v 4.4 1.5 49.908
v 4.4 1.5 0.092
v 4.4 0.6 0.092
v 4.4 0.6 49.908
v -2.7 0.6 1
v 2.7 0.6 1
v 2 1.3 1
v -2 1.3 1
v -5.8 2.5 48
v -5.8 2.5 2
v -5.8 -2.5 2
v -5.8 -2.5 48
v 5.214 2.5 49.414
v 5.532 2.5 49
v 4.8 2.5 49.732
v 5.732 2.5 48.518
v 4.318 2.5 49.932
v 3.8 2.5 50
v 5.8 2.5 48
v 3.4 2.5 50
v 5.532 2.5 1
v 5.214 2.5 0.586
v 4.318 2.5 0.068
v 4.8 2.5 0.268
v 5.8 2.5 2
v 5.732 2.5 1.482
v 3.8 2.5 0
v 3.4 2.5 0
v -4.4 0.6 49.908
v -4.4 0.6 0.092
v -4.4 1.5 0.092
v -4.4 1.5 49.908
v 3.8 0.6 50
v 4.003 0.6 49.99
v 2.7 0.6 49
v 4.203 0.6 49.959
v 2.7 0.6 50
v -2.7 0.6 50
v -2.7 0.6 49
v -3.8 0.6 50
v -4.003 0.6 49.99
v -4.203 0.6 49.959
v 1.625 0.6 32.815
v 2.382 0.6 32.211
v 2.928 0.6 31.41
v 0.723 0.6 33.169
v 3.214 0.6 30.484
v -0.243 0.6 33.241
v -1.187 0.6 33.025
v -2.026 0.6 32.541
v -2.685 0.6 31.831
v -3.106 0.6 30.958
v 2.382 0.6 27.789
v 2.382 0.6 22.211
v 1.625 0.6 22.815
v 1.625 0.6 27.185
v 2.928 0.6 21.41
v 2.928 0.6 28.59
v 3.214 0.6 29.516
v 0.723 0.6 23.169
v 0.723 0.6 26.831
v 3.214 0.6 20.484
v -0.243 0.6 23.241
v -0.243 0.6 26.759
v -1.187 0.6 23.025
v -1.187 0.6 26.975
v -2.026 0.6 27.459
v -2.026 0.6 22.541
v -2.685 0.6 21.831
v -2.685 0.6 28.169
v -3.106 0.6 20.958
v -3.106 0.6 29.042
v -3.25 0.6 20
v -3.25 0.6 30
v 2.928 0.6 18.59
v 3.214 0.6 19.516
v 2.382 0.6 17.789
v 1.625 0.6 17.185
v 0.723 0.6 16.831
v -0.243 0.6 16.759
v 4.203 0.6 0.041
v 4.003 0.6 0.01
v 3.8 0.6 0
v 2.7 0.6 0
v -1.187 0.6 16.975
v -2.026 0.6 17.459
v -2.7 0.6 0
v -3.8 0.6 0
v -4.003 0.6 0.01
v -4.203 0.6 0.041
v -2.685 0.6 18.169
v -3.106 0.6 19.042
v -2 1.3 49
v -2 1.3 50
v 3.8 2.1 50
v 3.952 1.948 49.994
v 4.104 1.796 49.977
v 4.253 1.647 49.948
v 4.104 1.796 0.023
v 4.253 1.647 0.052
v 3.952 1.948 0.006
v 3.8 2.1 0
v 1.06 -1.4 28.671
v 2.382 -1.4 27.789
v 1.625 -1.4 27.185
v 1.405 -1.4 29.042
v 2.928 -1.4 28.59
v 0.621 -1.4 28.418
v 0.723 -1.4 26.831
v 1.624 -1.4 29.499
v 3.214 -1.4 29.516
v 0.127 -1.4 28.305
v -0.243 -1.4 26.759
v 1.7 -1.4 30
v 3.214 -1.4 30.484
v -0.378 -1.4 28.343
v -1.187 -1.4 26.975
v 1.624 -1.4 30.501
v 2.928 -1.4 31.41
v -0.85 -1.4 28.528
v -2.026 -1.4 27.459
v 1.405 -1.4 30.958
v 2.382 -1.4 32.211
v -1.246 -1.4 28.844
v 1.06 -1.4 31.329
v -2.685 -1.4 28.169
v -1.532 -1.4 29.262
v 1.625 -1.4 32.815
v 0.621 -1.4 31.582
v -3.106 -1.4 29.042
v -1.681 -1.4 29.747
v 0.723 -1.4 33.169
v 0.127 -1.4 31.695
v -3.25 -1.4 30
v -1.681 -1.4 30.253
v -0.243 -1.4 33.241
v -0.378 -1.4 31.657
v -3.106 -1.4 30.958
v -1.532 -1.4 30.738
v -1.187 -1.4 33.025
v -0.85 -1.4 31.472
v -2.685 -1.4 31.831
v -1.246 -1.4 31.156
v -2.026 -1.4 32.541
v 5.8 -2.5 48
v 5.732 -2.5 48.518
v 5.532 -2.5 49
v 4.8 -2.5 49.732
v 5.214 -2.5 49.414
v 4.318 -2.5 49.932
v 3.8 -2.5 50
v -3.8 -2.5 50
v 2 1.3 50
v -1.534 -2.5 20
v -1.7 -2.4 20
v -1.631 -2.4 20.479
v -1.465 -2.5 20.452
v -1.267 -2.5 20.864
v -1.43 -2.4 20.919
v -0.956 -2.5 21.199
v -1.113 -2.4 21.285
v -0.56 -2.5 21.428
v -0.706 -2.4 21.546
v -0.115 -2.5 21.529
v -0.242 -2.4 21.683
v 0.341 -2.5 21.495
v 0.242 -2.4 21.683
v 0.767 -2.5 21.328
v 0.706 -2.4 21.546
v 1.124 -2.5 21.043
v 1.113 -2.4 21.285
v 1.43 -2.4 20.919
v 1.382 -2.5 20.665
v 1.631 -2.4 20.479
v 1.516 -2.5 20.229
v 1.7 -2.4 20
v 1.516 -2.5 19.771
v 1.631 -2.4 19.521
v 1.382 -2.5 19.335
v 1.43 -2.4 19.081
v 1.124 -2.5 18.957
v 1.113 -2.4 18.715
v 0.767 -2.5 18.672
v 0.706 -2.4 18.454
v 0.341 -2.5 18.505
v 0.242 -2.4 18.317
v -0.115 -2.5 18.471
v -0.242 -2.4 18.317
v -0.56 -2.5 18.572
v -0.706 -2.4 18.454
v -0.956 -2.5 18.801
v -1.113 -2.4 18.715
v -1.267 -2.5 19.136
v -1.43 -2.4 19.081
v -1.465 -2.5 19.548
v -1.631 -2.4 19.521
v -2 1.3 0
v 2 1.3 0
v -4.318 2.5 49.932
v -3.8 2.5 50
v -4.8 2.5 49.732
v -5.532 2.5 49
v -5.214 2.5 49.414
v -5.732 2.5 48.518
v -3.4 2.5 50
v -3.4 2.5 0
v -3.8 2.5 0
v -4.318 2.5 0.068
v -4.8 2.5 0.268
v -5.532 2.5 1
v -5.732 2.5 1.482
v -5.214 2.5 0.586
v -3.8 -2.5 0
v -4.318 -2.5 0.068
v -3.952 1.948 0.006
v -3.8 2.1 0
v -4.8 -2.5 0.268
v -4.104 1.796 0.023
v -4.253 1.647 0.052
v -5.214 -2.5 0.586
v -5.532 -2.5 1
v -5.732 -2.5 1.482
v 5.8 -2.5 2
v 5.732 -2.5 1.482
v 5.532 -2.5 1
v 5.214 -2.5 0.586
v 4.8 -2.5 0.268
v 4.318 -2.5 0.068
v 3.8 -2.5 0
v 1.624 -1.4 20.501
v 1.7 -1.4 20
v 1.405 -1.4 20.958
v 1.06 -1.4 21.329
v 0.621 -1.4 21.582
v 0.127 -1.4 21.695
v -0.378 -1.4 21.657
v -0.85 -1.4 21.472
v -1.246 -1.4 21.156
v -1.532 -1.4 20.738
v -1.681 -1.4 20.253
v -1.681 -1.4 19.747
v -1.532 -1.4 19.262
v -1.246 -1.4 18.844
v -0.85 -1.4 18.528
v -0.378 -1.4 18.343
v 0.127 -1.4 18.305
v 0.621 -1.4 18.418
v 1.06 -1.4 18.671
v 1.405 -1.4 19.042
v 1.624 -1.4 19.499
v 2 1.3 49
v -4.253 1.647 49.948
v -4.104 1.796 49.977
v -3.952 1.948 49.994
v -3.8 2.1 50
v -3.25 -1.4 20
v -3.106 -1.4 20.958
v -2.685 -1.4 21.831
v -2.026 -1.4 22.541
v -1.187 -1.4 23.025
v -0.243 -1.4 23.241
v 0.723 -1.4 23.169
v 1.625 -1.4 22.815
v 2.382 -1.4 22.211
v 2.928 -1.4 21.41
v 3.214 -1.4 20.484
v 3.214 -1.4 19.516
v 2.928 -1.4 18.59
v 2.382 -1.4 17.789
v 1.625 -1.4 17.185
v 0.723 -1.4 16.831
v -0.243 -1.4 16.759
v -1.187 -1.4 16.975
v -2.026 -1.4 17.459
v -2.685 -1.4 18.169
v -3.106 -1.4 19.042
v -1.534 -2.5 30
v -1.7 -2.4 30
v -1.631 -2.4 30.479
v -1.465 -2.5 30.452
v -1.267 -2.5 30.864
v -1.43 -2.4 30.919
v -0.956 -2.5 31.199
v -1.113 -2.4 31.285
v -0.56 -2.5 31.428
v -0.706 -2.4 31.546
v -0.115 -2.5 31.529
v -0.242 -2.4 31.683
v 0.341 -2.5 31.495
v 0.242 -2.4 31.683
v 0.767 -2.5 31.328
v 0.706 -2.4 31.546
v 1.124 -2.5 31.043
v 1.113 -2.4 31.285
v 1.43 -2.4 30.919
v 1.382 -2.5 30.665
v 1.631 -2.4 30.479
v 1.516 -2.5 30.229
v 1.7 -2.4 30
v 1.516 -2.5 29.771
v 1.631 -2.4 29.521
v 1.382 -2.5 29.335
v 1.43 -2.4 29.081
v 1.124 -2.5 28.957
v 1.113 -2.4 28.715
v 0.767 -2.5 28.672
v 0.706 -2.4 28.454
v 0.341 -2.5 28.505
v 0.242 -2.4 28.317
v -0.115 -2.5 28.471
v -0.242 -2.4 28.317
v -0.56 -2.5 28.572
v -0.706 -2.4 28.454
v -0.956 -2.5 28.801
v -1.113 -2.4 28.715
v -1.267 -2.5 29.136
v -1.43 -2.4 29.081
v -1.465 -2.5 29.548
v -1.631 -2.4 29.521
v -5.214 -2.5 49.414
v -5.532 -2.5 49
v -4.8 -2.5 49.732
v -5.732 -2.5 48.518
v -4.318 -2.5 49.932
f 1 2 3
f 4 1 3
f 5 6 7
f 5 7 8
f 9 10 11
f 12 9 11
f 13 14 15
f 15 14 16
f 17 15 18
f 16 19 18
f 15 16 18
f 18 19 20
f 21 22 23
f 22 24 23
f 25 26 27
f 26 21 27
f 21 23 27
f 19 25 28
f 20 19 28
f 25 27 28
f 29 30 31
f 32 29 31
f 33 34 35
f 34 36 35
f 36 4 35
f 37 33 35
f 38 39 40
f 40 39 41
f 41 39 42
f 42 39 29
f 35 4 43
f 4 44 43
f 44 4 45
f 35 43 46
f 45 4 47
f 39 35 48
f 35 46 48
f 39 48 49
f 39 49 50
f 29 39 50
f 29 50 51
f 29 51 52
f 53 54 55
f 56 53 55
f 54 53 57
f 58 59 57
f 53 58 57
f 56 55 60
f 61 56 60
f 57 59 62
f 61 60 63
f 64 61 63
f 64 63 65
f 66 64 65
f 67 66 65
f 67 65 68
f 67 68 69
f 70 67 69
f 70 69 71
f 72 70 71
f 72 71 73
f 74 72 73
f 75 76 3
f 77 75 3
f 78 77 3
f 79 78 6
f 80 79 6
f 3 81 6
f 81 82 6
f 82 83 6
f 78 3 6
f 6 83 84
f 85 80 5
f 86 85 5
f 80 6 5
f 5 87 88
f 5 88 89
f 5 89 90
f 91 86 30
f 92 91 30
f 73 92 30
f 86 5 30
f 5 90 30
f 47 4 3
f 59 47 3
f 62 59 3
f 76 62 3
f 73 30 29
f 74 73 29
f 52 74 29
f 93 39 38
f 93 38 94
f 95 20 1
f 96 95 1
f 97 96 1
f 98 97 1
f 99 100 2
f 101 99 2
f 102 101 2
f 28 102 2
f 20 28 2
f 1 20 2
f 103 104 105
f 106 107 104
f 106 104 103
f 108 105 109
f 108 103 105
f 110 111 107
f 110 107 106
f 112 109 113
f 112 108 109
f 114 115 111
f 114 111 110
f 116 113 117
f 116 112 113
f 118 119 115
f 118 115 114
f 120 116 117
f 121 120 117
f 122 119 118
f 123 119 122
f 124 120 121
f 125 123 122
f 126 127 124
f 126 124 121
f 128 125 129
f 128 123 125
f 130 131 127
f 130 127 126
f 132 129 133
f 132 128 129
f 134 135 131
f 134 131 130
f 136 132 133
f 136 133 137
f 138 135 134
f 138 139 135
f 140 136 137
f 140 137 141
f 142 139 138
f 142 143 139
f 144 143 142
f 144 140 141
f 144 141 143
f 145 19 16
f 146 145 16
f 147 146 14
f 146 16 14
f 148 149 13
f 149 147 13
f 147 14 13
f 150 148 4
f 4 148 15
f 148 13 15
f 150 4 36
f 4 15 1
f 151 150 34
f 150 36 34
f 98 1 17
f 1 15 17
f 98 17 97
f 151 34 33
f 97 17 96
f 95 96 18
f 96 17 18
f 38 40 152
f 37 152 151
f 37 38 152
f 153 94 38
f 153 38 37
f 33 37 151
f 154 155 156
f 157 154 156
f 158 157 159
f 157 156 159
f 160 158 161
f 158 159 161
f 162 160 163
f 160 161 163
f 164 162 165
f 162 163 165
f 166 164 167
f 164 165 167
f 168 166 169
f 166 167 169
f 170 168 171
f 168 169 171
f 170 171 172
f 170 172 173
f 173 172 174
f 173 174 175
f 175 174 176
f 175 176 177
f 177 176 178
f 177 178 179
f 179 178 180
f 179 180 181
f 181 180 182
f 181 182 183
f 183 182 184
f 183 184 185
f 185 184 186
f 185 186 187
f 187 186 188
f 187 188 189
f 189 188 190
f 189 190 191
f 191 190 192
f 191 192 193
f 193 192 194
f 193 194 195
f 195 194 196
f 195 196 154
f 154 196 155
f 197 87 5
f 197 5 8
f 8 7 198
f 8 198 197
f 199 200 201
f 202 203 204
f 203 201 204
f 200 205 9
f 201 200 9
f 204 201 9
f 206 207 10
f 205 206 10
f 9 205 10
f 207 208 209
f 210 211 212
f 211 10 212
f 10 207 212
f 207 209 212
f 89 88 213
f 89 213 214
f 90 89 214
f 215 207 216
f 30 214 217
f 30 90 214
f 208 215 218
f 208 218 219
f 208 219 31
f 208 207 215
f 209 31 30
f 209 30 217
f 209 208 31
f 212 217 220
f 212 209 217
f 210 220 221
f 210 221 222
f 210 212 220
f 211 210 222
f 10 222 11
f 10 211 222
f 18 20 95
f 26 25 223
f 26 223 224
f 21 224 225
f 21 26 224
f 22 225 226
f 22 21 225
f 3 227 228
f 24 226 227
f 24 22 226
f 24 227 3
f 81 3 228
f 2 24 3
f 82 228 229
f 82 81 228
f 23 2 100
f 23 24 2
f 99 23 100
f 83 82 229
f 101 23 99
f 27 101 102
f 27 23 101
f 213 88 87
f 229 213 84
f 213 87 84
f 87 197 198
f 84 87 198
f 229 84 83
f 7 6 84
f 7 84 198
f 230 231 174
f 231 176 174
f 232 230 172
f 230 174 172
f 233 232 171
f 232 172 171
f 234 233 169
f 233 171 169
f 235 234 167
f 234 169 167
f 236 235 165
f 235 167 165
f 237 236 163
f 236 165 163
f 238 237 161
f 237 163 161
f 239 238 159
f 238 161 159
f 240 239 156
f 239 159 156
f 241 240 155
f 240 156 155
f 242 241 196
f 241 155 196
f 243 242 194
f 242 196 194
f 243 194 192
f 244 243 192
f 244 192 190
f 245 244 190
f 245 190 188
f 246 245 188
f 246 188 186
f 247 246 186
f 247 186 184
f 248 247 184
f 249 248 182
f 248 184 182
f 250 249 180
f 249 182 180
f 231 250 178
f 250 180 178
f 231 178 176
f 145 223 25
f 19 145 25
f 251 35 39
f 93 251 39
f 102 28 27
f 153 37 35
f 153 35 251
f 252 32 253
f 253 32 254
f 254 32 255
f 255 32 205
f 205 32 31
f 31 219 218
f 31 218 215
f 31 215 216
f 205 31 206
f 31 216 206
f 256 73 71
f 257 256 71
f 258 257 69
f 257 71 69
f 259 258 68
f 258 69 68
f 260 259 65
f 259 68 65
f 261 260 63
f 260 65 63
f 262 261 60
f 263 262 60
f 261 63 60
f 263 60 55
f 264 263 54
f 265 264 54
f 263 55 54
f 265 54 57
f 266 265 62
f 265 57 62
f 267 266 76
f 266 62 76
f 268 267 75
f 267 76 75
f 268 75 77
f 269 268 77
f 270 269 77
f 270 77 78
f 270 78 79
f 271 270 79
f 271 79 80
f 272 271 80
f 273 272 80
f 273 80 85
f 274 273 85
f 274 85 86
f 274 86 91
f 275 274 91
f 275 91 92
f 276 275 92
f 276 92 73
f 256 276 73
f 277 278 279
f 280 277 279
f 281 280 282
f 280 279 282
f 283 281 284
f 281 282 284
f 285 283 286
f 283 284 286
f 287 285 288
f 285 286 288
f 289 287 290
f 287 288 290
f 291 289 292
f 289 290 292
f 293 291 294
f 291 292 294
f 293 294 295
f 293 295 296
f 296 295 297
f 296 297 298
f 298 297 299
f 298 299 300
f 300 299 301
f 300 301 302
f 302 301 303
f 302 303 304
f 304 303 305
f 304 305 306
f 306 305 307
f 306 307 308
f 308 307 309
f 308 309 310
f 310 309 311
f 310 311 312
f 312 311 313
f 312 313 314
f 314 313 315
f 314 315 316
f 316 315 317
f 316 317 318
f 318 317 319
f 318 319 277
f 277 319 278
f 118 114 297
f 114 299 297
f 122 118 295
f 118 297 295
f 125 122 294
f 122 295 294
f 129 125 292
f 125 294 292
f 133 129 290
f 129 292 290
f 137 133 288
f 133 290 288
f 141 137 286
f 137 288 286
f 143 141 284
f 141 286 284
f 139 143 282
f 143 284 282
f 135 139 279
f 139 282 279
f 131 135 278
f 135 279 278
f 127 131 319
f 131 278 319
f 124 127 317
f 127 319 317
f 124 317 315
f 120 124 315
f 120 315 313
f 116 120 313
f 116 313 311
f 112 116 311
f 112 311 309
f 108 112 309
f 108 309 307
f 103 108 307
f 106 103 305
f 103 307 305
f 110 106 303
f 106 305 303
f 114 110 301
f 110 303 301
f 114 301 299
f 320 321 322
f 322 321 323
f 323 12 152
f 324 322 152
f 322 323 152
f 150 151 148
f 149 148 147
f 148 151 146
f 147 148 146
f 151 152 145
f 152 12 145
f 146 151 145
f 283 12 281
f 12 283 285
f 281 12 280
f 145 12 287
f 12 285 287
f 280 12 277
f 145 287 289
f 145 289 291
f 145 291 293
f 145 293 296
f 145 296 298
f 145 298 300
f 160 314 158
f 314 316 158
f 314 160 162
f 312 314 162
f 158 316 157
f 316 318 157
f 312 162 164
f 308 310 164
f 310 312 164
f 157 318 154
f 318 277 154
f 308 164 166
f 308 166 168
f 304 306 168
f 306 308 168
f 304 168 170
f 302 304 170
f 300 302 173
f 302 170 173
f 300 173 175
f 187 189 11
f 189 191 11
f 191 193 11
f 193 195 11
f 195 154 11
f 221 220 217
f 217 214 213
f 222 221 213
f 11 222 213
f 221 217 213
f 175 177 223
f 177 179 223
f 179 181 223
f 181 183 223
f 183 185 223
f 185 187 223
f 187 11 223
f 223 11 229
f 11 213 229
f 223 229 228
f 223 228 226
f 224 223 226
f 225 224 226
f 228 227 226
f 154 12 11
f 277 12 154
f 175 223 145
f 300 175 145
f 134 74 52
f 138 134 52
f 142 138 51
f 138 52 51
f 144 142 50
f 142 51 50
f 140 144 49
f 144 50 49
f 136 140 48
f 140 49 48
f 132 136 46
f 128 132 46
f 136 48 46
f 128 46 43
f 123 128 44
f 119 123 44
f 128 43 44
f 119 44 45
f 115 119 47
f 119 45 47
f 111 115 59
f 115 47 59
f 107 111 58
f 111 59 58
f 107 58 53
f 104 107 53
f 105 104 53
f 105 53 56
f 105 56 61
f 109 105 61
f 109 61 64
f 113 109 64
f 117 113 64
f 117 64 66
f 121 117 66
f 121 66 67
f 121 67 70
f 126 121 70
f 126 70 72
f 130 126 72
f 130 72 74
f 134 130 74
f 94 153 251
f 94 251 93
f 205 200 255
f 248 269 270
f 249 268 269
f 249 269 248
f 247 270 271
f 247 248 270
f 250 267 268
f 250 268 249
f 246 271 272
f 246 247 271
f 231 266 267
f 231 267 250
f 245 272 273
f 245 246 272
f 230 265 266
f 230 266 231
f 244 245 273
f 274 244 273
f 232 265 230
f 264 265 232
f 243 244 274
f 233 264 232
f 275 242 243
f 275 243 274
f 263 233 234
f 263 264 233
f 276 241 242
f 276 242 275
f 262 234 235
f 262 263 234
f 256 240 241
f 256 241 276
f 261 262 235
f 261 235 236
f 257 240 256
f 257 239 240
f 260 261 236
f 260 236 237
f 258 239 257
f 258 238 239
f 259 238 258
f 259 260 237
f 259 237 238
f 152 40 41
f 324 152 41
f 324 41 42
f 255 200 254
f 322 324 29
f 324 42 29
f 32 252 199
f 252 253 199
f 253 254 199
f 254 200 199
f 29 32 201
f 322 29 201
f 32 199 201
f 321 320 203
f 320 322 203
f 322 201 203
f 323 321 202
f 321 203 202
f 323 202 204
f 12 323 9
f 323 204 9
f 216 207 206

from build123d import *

# Parameters (mm, degrees)
F1_DEPTH       = 50
F3_D           = 3.4
F3_DEPTH       = 3
F3_CBORE_D     = 6.5
F3_CBORE_DEPTH = 2
F3_TIP         = 1.0214630523
F2_W           = 6
F2_H           = 1
F4_DEPTH       = 0.7
F5_T4_DEPTH    = 55.1433659759
F5_T9_DEPTH    = 55.1433659759
F5_T14_DEPTH   = 6.1433659759
F5_T19_DEPTH   = 6.1433659759
F5_T24_DEPTH   = 6.1433659759
F5_T29_DEPTH   = 6.1433659759
F6_T1_DEPTH    = 15


# Not quite as in the source:
# - a fillet or chamfer that OpenCascade refuses, or shapes differently, is made with other operations: its cross-section is extruded or revolved along the edge and cut away or added


with BuildPart() as f1:
    # F0 (on Top) → F1 (new body)
    with BuildSketch(Plane.XY):
        Polygon((-5.8, -2.5), (5.8, -2.5), (5.8, 2.5), (3.4, 2.5), (3.4, 1.5), (4.4, 1.5), (4.4, 0.6), (-4.4, 0.6), (-4.4, 1.5), (-3.4, 1.5), (-3.4, 2.5), (-5.8, 2.5), align=None)
    extrude(amount=F1_DEPTH)

    # F3
    with Locations(Plane(origin=(0, 0.6, 0), x_dir=(-1, 0, 0), z_dir=(0, 1, 0))):
        with Locations((0, 30), (0, 20)):
            CounterBoreHole(F3_D / 2, F3_CBORE_D / 2, F3_CBORE_DEPTH, depth=F3_DEPTH)
            with Locations((0, 0, -(F3_DEPTH + F3_TIP / 2))):  # 118° drill point
                Cone(0, F3_D / 2, F3_TIP, mode=Mode.SUBTRACT)

    # F2 (on face) → F4 (join)
    with BuildSketch(Plane(origin=(0, 0.6, 0), x_dir=(-1, 0, 0), z_dir=(0, 1, 0))):
        with Locations((0, 49.5)):
            Rectangle(F2_W, F2_H)
        with Locations((0, 0.5)):
            Rectangle(F2_W, F2_H)
    extrude(amount=F4_DEPTH)

    # F5: chamfer of 1 on 6 edges, made by hand


with BuildPart() as f5_tool2:
    # F5_s3 → F5_t4 (new body)
    with BuildSketch(Plane.XY.offset(-2.571682988)):
        Polygon((3.4, 2.5), (4.4, 1.5), (3.4, 1.5), align=None)
    extrude(amount=F5_T4_DEPTH)

    split(bisect_by=Plane.YZ.offset(4.4), keep=Keep.BOTTOM)


with BuildPart() as f1_1:
    add(f1.part)

    # F5_t1: cut F5_tool2
    add(f5_tool2.part, mode=Mode.SUBTRACT)


with BuildPart() as f5_tool7:
    # F5_s8 → F5_t9 (new body)
    with BuildSketch(Plane.XY.offset(-2.571682988)):
        Polygon((-4.4, 1.5), (-3.4, 2.5), (-3.4, 1.5), align=None)
    extrude(amount=F5_T9_DEPTH)

    split(bisect_by=Plane.YZ.offset(-4.4), keep=Keep.TOP)


with BuildPart() as f1_2:
    add(f1_1.part)

    # F5_t6: cut F5_tool7
    add(f5_tool7.part, mode=Mode.SUBTRACT)


with BuildPart() as f5_tool12:
    # F5_s13 → F5_t14 (new body)
    with BuildSketch(Plane.XY.offset(-2.571682988)):
        Polygon((-3, 0.3), (-2, 1.3), (-3, 1.3), align=None)
    extrude(amount=F5_T14_DEPTH)

    split(bisect_by=Plane.XZ.offset(-0.6), keep=Keep.BOTTOM)


with BuildPart() as f1_3:
    add(f1_2.part)

    # F5_t11: cut F5_tool12
    add(f5_tool12.part, mode=Mode.SUBTRACT)


with BuildPart() as f5_tool17:
    # F5_s18 → F5_t19 (new body)
    with BuildSketch(Plane.XY.offset(3.571682988)):
        Polygon((3, 0.3), (2, 1.3), (3, 1.3), align=None)
    extrude(amount=-F5_T19_DEPTH)

    split(bisect_by=Plane.XZ.offset(-0.6), keep=Keep.BOTTOM)


with BuildPart() as f1_4:
    add(f1_3.part)

    # F5_t16: cut F5_tool17
    add(f5_tool17.part, mode=Mode.SUBTRACT)


with BuildPart() as f5_tool22:
    # F5_s23 → F5_t24 (new body)
    with BuildSketch(Plane.XY.offset(52.571682988)):
        Polygon((3, 0.3), (2, 1.3), (3, 1.3), align=None)
    extrude(amount=-F5_T24_DEPTH)

    split(bisect_by=Plane.XZ.offset(-0.6), keep=Keep.BOTTOM)


with BuildPart() as f1_5:
    add(f1_4.part)

    # F5_t21: cut F5_tool22
    add(f5_tool22.part, mode=Mode.SUBTRACT)


with BuildPart() as f5_tool27:
    # F5_s28 → F5_t29 (new body)
    with BuildSketch(Plane.XY.offset(46.428317012)):
        Polygon((-3, 0.3), (-2, 1.3), (-3, 1.3), align=None)
    extrude(amount=F5_T29_DEPTH)

    split(bisect_by=Plane.XZ.offset(-0.6), keep=Keep.BOTTOM)


with BuildPart() as f1_6:
    add(f1_5.part)

    # F5_t26: cut F5_tool27
    add(f5_tool27.part, mode=Mode.SUBTRACT)

    # F6: fillet of radius 2 on 4 edges, made by hand

    # F6_s2 → F6_t1 (cut)
    with BuildSketch(Plane.XZ.offset(-7.5)):
        with BuildLine():
            ThreePointArc((5.8, 48), (5.2142135624, 49.4142135624), (3.8, 50))
            Line((3.8, 50), (5.8, 50))
            Line((5.8, 50), (5.8, 48))
        make_face()
        with BuildLine():
            ThreePointArc((-3.8, 50), (-5.2142135624, 49.4142135624), (-5.8, 48))
            Line((-5.8, 48), (-5.8, 50))
            Line((-5.8, 50), (-3.8, 50))
        make_face()
        with BuildLine():
            ThreePointArc((-3.8, 0), (-5.2142135624, 0.5857864376), (-5.8, 2))
            Line((-5.8, 2), (-5.8, 0))
            Line((-5.8, 0), (-3.8, 0))
        make_face()
        with BuildLine():
            ThreePointArc((5.8, 2), (5.2142135624, 0.5857864376), (3.8, 0))
            Line((3.8, 0), (5.8, 0))
            Line((5.8, 0), (5.8, 2))
        make_face()
    extrude(amount=F6_T1_DEPTH, mode=Mode.SUBTRACT)


solid = f1_6.part
